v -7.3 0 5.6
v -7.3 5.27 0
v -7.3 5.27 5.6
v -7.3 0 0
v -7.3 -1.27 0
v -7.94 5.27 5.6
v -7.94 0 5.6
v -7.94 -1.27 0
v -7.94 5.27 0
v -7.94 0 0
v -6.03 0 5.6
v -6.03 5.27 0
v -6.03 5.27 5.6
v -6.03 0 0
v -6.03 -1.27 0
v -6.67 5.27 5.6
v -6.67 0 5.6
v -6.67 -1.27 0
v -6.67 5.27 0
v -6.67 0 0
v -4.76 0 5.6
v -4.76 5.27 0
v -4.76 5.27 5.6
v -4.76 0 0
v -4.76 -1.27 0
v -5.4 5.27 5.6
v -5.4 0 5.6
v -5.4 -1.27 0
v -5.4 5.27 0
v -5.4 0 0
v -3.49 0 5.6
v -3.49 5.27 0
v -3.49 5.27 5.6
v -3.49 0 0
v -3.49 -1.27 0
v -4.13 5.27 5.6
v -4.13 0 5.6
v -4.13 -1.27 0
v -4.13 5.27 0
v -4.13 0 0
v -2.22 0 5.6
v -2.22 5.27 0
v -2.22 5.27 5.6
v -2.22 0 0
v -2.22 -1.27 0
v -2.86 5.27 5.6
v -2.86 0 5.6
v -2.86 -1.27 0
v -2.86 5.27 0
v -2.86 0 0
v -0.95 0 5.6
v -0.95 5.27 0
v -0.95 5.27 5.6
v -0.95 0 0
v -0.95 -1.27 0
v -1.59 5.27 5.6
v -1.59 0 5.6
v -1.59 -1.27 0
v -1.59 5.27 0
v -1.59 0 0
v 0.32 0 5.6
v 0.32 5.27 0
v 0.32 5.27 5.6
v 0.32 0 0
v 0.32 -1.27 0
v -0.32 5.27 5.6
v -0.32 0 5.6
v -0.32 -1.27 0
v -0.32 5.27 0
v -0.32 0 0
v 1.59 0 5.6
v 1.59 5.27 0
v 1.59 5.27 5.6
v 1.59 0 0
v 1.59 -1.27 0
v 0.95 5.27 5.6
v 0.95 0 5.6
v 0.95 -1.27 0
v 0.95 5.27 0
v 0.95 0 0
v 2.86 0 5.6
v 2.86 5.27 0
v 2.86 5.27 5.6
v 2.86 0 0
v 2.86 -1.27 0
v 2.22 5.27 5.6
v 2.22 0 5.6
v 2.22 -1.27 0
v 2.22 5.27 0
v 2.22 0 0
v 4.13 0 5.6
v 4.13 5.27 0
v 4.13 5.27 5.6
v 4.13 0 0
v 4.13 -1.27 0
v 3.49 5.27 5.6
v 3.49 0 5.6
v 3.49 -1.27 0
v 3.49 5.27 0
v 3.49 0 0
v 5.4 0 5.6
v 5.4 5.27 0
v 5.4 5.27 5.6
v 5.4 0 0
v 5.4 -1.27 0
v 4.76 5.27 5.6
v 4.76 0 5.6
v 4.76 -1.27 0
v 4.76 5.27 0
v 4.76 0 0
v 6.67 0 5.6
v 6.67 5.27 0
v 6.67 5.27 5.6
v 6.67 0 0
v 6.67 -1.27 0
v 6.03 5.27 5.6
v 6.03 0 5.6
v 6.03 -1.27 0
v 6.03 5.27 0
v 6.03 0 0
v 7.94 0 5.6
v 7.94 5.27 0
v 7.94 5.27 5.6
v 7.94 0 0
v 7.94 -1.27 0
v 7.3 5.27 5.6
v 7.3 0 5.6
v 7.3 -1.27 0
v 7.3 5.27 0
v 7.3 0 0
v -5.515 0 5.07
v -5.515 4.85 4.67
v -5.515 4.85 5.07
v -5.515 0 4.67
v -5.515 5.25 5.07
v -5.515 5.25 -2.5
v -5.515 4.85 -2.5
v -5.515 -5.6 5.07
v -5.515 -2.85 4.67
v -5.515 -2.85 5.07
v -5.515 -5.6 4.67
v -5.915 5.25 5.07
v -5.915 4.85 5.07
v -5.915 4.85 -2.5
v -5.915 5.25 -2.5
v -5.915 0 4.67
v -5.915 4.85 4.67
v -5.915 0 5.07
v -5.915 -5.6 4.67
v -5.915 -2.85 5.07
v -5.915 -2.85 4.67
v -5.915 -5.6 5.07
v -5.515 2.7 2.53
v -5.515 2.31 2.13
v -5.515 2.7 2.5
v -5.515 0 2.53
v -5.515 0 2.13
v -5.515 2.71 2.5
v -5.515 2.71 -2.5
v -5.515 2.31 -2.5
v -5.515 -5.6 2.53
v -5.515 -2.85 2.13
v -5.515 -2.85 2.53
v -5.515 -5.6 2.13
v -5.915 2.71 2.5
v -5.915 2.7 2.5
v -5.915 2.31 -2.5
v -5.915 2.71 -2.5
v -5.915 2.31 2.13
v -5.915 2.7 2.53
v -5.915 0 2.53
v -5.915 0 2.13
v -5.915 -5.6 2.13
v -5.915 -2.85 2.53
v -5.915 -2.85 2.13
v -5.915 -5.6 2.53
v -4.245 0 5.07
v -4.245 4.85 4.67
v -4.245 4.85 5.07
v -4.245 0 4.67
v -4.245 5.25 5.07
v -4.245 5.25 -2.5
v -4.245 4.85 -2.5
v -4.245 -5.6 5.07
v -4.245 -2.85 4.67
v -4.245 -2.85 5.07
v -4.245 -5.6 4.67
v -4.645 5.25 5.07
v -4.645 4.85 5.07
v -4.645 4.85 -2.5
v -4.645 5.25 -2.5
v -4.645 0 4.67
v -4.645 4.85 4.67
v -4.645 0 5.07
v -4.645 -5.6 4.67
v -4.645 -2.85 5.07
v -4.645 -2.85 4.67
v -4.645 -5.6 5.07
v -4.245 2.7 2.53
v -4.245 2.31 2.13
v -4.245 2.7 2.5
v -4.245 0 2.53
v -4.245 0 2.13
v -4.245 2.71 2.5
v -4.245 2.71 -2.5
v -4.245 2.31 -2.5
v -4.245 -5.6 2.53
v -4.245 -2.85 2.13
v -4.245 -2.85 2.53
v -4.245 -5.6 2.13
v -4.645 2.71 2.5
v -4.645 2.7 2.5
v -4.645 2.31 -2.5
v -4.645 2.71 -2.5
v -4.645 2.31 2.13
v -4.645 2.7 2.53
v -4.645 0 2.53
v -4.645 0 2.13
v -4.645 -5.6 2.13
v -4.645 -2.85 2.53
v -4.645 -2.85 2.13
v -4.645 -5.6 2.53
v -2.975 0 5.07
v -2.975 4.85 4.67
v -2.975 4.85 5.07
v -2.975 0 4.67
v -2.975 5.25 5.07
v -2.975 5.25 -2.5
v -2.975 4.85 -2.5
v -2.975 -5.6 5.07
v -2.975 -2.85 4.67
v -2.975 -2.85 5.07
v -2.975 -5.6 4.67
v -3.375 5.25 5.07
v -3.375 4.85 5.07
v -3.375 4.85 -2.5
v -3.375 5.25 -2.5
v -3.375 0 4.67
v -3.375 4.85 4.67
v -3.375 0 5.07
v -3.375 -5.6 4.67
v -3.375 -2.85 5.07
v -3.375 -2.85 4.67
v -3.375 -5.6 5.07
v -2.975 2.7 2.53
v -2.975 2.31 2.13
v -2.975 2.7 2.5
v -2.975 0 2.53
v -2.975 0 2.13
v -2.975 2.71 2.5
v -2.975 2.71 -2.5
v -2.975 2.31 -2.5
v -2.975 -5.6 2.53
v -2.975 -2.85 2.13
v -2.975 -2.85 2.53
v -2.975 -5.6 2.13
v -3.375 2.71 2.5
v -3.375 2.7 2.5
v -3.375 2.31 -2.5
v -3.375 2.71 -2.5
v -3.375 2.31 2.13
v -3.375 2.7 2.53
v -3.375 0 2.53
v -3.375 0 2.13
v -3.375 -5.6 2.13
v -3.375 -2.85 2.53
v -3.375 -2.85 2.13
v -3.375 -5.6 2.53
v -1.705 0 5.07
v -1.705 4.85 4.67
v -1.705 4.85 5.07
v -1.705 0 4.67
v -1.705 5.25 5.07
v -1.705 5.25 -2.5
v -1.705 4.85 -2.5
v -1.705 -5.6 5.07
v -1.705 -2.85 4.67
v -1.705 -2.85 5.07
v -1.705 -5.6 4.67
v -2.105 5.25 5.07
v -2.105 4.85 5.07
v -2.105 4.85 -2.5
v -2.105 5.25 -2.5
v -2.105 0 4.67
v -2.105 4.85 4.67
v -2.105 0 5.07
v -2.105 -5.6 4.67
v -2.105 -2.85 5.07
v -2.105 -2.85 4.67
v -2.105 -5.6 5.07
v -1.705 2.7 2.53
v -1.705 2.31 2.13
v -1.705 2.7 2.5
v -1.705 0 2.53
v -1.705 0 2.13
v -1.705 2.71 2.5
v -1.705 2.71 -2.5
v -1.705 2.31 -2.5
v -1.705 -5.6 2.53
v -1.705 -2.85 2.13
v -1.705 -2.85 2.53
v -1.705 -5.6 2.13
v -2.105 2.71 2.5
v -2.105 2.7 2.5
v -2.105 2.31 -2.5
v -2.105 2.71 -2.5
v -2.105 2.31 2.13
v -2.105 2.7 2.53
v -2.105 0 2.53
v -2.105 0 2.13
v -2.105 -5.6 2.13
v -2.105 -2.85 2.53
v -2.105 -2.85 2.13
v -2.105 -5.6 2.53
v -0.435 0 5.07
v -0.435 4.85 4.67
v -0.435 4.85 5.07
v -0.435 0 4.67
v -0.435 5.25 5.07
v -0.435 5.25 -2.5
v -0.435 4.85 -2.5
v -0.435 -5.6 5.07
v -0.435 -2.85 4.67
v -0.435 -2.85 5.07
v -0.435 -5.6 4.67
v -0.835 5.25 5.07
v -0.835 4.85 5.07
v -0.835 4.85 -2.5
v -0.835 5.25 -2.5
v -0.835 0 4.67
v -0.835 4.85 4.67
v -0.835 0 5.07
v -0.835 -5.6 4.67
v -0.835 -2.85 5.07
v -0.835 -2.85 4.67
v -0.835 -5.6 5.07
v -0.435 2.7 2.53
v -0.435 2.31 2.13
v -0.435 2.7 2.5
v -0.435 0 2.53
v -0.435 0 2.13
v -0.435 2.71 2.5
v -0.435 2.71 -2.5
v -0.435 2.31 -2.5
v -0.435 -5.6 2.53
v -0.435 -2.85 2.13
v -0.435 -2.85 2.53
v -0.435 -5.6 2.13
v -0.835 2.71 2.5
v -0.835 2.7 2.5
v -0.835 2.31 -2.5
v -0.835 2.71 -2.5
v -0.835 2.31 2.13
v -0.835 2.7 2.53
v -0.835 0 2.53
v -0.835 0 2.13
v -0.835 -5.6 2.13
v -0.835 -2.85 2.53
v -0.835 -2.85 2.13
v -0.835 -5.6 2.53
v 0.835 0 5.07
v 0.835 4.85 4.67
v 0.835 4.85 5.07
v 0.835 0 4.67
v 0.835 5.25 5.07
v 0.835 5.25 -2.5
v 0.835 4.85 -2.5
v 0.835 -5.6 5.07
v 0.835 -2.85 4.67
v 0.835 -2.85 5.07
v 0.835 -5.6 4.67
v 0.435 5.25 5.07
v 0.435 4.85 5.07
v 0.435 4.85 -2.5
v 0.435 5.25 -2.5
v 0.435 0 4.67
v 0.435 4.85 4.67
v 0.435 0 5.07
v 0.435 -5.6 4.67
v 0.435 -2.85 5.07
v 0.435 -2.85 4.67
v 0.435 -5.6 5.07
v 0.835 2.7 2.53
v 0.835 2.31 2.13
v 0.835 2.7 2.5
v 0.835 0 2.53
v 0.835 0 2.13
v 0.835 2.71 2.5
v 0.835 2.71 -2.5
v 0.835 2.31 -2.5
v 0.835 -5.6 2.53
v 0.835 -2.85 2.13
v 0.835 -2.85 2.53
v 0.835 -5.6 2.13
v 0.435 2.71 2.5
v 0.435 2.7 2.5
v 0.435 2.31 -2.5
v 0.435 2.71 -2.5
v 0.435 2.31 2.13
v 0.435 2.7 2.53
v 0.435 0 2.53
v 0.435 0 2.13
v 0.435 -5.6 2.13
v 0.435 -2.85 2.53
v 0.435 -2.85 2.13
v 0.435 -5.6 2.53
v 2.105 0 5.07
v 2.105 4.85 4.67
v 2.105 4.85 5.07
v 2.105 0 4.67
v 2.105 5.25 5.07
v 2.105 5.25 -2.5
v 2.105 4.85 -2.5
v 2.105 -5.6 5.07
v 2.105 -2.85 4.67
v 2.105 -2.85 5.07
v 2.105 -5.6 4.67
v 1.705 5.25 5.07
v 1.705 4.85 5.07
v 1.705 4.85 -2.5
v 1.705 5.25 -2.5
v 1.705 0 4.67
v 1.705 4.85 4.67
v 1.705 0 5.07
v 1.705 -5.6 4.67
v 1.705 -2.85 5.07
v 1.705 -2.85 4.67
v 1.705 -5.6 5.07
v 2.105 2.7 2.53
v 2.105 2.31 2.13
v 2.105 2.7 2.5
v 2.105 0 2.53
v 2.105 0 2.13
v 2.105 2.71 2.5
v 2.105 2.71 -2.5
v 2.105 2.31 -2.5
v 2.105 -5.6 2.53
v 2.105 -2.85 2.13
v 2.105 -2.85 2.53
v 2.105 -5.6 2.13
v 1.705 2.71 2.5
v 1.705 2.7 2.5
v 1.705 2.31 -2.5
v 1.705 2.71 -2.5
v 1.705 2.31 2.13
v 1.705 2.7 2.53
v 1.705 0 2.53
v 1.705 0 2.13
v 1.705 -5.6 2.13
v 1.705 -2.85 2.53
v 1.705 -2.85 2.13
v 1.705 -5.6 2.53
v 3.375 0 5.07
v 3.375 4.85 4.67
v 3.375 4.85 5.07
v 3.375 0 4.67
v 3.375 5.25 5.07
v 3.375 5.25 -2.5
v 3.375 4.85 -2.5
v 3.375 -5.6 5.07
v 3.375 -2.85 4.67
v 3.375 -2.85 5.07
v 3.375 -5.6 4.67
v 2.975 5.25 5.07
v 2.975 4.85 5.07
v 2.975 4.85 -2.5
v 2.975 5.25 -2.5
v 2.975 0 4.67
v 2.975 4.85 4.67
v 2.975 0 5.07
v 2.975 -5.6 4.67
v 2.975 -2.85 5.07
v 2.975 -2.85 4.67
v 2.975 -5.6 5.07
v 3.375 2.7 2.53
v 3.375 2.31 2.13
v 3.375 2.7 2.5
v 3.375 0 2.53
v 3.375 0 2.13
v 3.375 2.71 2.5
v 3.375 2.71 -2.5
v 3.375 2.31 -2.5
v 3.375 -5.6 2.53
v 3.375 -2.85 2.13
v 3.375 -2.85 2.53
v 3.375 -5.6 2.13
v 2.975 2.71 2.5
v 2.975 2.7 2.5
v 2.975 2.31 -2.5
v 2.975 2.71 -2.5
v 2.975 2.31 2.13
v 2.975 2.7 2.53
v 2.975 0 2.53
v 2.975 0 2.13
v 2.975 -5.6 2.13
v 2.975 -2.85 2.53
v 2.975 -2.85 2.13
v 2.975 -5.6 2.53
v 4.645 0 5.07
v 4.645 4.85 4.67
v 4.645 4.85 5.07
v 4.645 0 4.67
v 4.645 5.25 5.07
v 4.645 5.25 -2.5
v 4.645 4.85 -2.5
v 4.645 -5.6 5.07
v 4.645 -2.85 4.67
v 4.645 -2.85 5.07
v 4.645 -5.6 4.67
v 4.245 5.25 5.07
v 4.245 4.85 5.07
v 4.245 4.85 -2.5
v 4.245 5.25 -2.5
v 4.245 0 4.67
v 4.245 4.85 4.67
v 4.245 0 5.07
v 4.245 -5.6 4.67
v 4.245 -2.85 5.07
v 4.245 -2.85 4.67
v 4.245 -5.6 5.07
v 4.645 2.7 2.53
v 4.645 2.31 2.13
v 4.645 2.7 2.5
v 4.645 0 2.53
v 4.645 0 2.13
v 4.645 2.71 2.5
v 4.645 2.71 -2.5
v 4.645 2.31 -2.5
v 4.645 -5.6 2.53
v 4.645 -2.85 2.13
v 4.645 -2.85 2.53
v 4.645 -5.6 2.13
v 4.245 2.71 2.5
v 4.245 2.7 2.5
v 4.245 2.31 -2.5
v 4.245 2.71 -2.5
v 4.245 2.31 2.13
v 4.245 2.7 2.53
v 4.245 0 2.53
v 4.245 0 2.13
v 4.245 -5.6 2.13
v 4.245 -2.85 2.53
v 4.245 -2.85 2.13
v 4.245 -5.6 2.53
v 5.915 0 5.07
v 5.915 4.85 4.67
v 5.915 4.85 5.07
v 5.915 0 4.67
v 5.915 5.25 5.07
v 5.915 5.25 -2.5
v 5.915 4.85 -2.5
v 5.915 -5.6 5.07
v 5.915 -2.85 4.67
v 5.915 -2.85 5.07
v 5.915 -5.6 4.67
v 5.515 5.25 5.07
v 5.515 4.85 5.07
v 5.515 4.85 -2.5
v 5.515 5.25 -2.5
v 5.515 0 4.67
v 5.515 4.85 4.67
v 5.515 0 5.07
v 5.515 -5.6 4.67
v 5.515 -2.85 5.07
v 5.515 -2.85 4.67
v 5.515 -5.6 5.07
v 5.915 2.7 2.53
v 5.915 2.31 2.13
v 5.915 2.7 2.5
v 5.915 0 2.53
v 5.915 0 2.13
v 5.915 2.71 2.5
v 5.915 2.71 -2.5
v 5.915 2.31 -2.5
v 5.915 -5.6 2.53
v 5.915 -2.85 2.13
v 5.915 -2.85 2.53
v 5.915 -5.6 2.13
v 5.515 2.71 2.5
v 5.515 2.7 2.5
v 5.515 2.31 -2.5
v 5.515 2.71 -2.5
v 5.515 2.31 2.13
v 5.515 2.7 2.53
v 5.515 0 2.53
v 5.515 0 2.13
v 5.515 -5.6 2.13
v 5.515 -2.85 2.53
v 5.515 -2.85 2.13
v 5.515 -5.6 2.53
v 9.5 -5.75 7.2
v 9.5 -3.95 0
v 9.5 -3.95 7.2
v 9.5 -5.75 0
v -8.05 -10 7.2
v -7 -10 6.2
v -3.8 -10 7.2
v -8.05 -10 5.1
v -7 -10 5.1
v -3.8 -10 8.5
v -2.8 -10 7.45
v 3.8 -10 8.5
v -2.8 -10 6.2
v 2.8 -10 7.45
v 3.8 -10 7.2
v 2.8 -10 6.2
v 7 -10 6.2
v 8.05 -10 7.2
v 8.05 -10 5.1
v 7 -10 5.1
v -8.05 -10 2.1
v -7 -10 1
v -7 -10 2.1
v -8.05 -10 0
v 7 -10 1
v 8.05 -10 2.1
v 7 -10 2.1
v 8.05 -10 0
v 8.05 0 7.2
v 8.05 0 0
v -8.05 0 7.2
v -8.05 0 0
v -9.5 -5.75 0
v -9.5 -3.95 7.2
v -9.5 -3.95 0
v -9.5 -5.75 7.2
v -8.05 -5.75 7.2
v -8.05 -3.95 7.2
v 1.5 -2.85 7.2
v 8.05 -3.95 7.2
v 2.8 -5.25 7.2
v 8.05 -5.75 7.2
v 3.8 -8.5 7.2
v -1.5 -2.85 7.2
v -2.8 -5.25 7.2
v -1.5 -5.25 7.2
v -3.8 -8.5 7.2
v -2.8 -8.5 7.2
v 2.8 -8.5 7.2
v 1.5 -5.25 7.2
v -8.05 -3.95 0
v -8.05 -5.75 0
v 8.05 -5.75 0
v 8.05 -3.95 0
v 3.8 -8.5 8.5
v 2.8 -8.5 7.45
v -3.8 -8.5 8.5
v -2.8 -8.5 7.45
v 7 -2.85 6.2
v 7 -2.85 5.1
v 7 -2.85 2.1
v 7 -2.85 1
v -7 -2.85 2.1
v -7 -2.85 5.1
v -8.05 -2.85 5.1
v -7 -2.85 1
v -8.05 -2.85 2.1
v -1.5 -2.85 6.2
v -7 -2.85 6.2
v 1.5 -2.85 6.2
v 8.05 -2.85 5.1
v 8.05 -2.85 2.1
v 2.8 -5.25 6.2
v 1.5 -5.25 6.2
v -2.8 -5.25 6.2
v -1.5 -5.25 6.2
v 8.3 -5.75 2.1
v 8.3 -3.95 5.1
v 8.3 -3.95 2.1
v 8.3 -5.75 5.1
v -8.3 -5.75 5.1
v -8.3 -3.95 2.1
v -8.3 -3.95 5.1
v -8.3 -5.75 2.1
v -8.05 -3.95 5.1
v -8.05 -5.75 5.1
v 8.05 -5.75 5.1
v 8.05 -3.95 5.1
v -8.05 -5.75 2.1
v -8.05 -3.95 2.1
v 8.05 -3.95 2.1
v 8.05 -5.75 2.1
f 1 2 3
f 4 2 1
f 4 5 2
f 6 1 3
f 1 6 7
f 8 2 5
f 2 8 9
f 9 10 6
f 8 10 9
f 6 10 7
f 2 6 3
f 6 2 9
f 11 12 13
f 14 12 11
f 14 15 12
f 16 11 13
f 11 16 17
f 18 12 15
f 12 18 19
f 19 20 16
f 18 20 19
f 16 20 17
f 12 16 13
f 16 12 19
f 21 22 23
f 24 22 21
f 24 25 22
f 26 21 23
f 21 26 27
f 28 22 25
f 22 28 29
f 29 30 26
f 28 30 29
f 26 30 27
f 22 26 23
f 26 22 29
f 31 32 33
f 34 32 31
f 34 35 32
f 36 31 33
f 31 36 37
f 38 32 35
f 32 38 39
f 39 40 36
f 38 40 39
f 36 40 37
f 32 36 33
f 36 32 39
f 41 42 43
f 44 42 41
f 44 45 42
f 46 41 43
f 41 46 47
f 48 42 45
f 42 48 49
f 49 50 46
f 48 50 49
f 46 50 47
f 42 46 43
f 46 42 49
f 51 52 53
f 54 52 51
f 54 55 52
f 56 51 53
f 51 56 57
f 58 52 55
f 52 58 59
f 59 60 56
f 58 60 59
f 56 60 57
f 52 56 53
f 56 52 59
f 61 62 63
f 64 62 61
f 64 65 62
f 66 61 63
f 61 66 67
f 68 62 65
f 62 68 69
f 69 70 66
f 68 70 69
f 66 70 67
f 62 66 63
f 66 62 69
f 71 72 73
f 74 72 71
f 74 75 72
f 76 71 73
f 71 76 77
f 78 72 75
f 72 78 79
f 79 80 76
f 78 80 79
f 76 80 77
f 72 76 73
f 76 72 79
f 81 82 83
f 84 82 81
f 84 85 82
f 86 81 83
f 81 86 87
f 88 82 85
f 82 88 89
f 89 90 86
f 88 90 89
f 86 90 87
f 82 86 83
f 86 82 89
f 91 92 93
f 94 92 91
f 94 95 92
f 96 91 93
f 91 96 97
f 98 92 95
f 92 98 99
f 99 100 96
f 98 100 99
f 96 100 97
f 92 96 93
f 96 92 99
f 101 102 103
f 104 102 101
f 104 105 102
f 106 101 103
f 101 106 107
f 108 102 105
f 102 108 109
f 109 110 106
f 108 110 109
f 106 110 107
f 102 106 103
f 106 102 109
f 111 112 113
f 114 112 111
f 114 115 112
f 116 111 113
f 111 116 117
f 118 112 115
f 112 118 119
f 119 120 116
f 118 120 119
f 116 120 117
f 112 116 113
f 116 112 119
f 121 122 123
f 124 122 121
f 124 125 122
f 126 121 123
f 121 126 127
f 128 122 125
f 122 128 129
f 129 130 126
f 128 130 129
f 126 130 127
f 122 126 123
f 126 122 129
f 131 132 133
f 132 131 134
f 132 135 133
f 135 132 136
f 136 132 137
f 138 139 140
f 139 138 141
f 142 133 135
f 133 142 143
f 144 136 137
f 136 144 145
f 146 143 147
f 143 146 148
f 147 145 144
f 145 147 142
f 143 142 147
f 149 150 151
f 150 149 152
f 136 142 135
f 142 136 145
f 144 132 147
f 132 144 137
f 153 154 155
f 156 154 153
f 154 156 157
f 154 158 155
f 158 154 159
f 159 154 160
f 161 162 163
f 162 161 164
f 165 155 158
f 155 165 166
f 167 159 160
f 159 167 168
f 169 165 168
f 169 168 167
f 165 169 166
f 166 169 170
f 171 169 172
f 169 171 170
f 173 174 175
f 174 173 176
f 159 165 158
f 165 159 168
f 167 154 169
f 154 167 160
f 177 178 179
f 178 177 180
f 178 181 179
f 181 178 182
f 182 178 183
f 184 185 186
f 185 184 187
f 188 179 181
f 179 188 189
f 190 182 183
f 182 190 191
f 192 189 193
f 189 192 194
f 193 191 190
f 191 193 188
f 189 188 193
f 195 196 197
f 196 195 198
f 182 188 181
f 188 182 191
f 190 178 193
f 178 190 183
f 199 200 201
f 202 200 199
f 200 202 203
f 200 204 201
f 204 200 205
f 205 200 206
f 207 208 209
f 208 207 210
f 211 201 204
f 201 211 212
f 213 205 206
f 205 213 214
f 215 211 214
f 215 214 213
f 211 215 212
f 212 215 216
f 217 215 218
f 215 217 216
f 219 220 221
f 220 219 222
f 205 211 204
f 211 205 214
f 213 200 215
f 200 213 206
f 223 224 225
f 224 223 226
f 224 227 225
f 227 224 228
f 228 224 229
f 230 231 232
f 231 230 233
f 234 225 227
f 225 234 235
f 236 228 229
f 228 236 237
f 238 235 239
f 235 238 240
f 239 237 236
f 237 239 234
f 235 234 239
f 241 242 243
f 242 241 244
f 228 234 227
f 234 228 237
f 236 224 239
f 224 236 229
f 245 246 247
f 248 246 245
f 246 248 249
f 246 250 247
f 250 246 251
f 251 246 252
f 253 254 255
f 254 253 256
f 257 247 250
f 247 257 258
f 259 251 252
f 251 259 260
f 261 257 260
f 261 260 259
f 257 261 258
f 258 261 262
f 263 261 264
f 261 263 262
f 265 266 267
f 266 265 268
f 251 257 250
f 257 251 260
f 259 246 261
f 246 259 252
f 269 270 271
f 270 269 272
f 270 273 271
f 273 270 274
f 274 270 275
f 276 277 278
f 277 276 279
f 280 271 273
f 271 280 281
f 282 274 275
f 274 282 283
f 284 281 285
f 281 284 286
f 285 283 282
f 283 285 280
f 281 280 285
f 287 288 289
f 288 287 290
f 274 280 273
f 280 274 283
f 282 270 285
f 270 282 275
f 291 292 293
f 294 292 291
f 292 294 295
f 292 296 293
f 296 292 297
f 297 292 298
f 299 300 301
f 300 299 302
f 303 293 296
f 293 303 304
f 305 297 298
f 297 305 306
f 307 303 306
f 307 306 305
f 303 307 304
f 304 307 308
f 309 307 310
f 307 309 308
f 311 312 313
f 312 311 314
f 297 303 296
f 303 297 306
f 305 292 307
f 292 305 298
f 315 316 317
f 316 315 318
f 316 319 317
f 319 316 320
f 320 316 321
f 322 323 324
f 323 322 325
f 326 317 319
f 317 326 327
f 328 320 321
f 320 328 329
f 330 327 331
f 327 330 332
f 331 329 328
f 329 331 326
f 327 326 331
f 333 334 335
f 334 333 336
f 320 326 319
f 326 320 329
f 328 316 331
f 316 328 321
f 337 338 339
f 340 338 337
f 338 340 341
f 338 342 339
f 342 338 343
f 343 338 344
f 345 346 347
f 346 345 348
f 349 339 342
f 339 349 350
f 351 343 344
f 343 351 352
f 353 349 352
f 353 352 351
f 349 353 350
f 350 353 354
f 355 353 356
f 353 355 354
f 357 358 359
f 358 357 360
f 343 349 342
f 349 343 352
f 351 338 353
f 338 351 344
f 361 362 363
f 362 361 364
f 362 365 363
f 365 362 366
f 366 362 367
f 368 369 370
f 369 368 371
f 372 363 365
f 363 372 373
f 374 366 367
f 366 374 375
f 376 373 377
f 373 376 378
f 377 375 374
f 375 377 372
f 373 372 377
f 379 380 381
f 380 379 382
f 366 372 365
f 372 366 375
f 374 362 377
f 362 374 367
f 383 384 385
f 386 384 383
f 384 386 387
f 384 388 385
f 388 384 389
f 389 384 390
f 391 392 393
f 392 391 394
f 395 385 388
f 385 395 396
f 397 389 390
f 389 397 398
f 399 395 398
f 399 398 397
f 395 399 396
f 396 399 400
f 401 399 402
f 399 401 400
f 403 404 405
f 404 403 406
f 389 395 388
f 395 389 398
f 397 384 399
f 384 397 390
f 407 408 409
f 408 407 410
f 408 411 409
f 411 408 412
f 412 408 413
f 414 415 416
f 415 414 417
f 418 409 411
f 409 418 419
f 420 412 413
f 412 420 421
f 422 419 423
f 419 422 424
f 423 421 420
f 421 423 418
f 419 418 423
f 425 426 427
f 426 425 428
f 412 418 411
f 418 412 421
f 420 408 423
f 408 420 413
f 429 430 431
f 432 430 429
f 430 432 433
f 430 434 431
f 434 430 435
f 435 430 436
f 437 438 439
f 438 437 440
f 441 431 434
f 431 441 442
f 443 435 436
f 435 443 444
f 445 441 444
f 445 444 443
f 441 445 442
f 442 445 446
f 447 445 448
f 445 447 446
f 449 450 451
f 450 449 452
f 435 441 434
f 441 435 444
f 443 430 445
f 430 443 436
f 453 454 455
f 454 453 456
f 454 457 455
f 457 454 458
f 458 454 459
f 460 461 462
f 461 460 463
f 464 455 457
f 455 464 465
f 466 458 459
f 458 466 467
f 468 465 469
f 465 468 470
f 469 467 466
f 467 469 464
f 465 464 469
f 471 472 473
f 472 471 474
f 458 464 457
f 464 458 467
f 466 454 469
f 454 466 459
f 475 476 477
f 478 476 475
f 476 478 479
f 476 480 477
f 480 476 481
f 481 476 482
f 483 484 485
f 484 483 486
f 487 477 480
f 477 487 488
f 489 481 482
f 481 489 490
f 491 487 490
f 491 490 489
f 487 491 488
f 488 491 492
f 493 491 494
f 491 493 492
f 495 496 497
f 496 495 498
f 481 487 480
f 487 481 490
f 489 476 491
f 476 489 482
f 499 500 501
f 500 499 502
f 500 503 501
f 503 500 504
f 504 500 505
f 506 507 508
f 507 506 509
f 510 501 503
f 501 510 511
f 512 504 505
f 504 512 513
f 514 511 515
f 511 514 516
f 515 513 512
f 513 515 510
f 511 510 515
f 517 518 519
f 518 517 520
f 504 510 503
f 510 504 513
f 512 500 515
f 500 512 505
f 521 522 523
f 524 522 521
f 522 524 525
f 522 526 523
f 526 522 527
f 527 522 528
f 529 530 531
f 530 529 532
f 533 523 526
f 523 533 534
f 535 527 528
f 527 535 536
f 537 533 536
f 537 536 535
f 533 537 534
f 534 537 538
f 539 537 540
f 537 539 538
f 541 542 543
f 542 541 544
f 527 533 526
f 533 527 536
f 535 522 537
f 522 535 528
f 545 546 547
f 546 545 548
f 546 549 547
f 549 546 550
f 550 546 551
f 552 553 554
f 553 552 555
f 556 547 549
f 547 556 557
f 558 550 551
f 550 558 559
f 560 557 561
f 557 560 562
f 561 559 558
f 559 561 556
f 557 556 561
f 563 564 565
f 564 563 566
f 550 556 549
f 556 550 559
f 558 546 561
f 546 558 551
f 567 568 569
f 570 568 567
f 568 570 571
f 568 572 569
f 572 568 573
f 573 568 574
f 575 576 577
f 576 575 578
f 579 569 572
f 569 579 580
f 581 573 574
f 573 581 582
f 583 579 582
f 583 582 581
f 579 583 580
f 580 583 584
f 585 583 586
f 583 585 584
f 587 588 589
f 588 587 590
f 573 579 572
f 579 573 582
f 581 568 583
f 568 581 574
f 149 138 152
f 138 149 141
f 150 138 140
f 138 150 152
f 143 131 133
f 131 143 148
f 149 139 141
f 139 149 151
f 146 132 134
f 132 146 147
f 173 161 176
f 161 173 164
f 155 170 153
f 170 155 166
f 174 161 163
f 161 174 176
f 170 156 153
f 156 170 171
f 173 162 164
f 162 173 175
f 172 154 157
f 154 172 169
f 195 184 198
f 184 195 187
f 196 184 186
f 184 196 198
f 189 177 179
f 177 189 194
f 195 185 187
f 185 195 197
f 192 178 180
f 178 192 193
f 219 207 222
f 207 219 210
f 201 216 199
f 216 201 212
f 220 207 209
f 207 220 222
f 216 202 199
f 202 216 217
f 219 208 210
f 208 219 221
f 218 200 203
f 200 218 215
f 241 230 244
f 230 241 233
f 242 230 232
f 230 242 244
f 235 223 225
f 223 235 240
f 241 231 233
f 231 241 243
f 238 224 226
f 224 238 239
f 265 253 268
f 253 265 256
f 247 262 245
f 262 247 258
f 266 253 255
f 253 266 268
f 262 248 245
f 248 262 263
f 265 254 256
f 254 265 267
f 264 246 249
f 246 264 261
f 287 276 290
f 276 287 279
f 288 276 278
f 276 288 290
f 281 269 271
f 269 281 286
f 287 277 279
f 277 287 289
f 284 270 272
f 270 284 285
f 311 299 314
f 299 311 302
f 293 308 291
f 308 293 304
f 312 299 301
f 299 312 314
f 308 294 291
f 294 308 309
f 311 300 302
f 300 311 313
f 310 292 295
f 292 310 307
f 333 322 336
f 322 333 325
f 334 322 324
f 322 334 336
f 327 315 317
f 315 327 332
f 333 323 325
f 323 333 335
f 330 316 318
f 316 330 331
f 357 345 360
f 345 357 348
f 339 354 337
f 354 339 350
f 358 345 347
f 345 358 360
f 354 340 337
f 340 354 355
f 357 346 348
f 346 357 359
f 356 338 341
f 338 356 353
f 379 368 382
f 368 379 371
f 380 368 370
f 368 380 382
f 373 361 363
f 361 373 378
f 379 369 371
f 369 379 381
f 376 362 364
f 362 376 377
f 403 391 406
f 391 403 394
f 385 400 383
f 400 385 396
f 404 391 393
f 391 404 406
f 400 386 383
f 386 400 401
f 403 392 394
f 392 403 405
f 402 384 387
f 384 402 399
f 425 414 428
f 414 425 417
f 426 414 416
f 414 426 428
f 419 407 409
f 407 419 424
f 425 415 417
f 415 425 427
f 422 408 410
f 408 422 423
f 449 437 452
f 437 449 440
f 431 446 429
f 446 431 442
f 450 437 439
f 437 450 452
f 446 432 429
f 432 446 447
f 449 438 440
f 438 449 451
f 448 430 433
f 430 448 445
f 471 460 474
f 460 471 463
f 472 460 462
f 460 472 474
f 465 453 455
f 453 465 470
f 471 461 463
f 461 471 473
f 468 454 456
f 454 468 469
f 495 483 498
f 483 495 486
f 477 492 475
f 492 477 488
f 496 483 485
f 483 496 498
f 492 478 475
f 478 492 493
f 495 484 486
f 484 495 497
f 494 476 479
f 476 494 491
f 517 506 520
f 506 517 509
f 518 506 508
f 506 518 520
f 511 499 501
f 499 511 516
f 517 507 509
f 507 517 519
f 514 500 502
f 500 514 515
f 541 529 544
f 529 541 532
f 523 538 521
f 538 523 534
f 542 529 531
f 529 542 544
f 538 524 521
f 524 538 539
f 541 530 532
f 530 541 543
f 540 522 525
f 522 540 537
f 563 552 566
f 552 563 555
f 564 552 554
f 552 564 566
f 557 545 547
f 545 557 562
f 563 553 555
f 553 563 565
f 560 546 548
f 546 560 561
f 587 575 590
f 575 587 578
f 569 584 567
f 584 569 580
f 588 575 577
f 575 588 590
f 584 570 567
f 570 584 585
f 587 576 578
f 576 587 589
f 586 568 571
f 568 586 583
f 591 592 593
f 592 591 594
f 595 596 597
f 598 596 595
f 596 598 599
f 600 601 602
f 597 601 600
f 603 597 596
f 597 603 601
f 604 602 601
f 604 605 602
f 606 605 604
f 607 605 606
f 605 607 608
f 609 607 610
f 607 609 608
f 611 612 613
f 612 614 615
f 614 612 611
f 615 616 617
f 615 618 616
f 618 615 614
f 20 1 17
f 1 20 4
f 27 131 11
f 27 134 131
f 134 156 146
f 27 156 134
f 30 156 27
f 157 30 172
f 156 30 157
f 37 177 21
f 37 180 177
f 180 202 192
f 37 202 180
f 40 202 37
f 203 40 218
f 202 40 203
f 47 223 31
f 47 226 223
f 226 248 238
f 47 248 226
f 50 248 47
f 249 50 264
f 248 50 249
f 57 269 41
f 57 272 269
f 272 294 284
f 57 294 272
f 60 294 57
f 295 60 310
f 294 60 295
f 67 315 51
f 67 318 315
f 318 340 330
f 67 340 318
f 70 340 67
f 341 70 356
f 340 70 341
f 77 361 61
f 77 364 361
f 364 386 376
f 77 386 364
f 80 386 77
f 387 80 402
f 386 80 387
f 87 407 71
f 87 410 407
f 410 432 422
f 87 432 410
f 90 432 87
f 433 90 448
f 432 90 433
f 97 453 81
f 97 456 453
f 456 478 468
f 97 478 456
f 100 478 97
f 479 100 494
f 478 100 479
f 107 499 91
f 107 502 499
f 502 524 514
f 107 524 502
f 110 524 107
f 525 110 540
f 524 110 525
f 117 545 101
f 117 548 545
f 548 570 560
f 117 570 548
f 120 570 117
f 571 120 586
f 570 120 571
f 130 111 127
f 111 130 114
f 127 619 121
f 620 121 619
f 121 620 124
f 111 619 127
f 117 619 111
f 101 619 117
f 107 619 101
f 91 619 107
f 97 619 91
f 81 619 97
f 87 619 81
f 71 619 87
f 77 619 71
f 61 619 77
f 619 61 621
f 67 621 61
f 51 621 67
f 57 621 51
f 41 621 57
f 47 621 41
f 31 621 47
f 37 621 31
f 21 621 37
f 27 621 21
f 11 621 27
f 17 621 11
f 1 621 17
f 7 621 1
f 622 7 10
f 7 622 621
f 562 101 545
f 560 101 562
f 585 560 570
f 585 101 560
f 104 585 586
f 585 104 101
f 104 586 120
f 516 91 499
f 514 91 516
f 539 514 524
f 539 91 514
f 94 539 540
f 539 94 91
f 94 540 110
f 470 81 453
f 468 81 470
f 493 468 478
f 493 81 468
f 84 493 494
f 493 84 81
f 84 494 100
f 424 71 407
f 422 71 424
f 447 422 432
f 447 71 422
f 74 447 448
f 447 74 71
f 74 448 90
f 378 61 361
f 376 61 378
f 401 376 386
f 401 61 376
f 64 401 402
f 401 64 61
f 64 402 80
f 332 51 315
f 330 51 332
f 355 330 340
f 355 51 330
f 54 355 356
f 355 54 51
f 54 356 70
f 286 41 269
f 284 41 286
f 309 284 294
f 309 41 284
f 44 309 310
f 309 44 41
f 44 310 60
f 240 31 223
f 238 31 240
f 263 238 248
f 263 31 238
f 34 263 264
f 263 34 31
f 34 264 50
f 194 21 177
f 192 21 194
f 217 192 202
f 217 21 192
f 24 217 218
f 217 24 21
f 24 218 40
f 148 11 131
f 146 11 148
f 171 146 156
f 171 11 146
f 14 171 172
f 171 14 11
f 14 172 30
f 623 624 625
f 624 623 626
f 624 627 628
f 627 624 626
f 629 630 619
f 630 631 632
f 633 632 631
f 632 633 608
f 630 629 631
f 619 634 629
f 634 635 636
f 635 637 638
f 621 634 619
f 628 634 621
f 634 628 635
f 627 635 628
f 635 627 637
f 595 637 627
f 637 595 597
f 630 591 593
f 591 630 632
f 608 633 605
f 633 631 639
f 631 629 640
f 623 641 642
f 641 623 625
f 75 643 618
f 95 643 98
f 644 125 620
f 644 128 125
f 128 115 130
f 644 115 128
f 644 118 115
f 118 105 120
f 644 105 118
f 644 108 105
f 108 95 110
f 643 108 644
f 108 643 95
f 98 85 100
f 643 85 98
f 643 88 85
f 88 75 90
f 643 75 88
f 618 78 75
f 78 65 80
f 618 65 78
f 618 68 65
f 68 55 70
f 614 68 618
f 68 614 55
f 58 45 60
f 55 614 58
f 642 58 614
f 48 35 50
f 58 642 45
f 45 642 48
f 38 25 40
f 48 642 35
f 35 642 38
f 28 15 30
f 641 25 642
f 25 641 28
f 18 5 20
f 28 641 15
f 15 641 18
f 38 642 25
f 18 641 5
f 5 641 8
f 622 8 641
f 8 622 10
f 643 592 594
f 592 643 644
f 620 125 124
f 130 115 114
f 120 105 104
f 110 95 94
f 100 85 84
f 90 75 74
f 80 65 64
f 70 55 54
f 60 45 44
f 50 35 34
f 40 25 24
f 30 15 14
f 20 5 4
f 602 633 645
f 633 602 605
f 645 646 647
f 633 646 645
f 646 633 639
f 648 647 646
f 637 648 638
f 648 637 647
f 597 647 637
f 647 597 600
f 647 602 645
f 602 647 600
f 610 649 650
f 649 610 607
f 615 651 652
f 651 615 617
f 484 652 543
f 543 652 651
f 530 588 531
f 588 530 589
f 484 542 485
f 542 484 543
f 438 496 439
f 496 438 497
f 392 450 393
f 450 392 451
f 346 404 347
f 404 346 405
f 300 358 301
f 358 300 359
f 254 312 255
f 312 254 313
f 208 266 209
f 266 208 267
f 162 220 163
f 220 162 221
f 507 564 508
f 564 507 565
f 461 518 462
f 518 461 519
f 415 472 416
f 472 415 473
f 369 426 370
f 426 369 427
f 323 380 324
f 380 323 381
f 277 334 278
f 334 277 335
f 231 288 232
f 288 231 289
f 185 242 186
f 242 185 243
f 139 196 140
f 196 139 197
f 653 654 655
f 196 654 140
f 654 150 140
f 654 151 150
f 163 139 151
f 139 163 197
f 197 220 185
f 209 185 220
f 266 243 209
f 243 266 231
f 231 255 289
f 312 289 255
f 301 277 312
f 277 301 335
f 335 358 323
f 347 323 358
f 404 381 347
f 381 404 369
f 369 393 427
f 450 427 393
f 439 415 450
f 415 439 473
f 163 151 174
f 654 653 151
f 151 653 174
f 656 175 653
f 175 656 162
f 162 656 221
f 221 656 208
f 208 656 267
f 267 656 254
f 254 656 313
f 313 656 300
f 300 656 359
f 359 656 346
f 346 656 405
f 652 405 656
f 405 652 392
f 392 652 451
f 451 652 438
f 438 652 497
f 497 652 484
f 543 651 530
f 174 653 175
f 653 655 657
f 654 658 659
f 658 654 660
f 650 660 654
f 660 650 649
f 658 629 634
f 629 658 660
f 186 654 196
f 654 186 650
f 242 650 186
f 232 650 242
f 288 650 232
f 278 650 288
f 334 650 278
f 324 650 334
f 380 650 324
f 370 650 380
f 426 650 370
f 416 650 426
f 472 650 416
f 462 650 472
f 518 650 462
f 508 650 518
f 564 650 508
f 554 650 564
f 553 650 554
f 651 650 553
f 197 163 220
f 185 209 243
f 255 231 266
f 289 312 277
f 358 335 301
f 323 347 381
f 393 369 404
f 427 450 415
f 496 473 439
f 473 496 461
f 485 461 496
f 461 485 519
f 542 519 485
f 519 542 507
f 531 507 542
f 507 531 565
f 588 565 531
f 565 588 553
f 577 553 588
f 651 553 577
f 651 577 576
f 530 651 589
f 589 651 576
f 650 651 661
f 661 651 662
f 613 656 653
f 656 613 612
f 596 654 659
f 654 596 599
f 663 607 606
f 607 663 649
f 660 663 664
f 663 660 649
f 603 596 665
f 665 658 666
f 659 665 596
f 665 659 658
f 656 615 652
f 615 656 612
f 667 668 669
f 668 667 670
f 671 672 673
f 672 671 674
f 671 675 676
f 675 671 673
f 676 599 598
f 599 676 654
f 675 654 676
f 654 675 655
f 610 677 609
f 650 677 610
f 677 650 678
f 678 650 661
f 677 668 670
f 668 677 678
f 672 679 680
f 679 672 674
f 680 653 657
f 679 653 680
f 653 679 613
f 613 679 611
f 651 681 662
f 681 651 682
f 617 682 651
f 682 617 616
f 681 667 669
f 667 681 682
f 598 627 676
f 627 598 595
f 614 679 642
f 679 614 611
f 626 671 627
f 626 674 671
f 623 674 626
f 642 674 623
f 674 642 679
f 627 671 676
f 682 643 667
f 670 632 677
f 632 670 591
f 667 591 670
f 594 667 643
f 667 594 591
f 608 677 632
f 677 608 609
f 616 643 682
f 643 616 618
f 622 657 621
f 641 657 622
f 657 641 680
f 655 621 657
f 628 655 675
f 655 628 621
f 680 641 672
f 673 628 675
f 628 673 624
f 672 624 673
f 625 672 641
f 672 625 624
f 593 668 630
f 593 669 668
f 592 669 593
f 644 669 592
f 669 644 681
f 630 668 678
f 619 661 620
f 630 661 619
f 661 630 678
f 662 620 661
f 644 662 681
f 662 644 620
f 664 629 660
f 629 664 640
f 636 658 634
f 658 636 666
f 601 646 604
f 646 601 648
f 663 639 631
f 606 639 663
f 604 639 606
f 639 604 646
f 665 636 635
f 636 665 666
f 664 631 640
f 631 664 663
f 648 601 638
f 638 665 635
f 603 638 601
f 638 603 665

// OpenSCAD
pin_pitch_x = 1.27;
pin_pitch_y = 2.54;
pin_width = 0.4;
pin_height = 8.1-2.5;
pin_depth = 2.5;

shroud_width = 7.2;
shroud_length = 19;
shroud_height = 10;

pin_separator_length = 4;

inset_length = 16;
inset_height = 4.3;
inset_height2 = 4;

internal_width = 5.2;
internal_length = 14;
internal_height = 7.2;

clip_length = 16.6;
clip_width = 3;

index_offset = 6.5 - internal_width;
index_offset3 = 8.5 - shroud_width;
index_width1 = 3;
index_width2 = 5.6;
index_height2 = 4.8;
index_height3 = 1.5;

color("#222") union() translate([-pin_pitch_x * 6, 0, 0]) for (x = [0 : 12]) {
    translate([x * pin_pitch_x, 0, 0]) {
        translate([0, pin_separator_length/2, pin_height/2]) cube([pin_width*1.6, pin_separator_length+2.54, pin_height], center = true);
    }
}

color("#fd1") union() translate([-pin_pitch_x * 4.5, 1.05, 0]) for (x = [0 : 9]) {
    translate([x * pin_pitch_x, 0, 0]) {
        translate([0, pin_separator_length, (pin_height - 0.53 - pin_depth) / 2]) cube([pin_width, pin_width, pin_height + pin_depth - 0.53], center = true);
        translate([0, pin_separator_length-pin_pitch_y, (pin_height - 3.1 - pin_depth) / 2]) cube([pin_width, pin_width, pin_height + pin_depth - 3.1], center = true);
    }
}

color("#fd1") translate([0, 0, shroud_width/2]) rotate([90, 0, 0]) {
    translate([-pin_pitch_x * 4.5, 0, 0]) for (x = [0 : 9]) {
        translate([x * pin_pitch_x, 0, 0]) {
            translate([0, pin_pitch_y/2, (pin_height - pin_depth - 2.54) / 2]) cube([pin_width, pin_width, pin_height + pin_depth + 2.54], center = true);
            translate([0, -pin_pitch_y/2, (pin_height - pin_depth - 0.2) / 2]) cube([pin_width, pin_width, pin_height + pin_depth + 0.2], center = true);
        }
    }
}

color("#222") translate([0, 0, shroud_width/2]) rotate([90, 0, 0]) {
    difference() {
        union() {
            translate([0, 0, shroud_height/2]) cube([shroud_length, shroud_width, shroud_height], center = true);
            translate([0, shroud_width/2 + index_offset3/2, shroud_height - index_height3/2]) cube([index_width2 + 2, index_offset3, index_height3], center = true);
        }
        
        union() {
        translate([0, 0, shroud_height - internal_height/2 + 0.05]) cube([internal_length, internal_width, internal_height], center = true);
        translate([0, 0, shroud_height - internal_height/2 + 0.05]) cube([clip_length, clip_width, internal_height], center = true);
        
        inset_w = (shroud_length - inset_length)/2;
        inset_x = shroud_length/2 - inset_w/2;
        inset_y = shroud_height - inset_height/2;
        translate([-inset_x - 0.05, 0, inset_y + 0.05]) cube([inset_w, shroud_width + 1, inset_height], center = true);
        translate([inset_x + 0.05, 0, inset_y + 0.05]) cube([inset_w, shroud_width + 1, inset_height], center = true);
        
        inset_y2 = inset_height2/2;
        translate([-inset_x - 0.05, 0, inset_y2 - 0.05]) cube([inset_w, shroud_width + 1, inset_height2], center = true);
        translate([inset_x + 0.05, 0, inset_y2 - 0.05]) cube([inset_w, shroud_width + 1, inset_height2], center = true);
        
        translate([0, internal_width/2 + index_offset/2 - 0.05, shroud_height - internal_height/2 + 0.05]) cube([index_width1, index_offset, internal_height], center = true);
        translate([0, internal_width/2 + index_offset/2 - 0.05, shroud_height - index_height2/2 + 0.05]) cube([index_width2, index_offset, index_height2], center = true);
        }
    }
}
